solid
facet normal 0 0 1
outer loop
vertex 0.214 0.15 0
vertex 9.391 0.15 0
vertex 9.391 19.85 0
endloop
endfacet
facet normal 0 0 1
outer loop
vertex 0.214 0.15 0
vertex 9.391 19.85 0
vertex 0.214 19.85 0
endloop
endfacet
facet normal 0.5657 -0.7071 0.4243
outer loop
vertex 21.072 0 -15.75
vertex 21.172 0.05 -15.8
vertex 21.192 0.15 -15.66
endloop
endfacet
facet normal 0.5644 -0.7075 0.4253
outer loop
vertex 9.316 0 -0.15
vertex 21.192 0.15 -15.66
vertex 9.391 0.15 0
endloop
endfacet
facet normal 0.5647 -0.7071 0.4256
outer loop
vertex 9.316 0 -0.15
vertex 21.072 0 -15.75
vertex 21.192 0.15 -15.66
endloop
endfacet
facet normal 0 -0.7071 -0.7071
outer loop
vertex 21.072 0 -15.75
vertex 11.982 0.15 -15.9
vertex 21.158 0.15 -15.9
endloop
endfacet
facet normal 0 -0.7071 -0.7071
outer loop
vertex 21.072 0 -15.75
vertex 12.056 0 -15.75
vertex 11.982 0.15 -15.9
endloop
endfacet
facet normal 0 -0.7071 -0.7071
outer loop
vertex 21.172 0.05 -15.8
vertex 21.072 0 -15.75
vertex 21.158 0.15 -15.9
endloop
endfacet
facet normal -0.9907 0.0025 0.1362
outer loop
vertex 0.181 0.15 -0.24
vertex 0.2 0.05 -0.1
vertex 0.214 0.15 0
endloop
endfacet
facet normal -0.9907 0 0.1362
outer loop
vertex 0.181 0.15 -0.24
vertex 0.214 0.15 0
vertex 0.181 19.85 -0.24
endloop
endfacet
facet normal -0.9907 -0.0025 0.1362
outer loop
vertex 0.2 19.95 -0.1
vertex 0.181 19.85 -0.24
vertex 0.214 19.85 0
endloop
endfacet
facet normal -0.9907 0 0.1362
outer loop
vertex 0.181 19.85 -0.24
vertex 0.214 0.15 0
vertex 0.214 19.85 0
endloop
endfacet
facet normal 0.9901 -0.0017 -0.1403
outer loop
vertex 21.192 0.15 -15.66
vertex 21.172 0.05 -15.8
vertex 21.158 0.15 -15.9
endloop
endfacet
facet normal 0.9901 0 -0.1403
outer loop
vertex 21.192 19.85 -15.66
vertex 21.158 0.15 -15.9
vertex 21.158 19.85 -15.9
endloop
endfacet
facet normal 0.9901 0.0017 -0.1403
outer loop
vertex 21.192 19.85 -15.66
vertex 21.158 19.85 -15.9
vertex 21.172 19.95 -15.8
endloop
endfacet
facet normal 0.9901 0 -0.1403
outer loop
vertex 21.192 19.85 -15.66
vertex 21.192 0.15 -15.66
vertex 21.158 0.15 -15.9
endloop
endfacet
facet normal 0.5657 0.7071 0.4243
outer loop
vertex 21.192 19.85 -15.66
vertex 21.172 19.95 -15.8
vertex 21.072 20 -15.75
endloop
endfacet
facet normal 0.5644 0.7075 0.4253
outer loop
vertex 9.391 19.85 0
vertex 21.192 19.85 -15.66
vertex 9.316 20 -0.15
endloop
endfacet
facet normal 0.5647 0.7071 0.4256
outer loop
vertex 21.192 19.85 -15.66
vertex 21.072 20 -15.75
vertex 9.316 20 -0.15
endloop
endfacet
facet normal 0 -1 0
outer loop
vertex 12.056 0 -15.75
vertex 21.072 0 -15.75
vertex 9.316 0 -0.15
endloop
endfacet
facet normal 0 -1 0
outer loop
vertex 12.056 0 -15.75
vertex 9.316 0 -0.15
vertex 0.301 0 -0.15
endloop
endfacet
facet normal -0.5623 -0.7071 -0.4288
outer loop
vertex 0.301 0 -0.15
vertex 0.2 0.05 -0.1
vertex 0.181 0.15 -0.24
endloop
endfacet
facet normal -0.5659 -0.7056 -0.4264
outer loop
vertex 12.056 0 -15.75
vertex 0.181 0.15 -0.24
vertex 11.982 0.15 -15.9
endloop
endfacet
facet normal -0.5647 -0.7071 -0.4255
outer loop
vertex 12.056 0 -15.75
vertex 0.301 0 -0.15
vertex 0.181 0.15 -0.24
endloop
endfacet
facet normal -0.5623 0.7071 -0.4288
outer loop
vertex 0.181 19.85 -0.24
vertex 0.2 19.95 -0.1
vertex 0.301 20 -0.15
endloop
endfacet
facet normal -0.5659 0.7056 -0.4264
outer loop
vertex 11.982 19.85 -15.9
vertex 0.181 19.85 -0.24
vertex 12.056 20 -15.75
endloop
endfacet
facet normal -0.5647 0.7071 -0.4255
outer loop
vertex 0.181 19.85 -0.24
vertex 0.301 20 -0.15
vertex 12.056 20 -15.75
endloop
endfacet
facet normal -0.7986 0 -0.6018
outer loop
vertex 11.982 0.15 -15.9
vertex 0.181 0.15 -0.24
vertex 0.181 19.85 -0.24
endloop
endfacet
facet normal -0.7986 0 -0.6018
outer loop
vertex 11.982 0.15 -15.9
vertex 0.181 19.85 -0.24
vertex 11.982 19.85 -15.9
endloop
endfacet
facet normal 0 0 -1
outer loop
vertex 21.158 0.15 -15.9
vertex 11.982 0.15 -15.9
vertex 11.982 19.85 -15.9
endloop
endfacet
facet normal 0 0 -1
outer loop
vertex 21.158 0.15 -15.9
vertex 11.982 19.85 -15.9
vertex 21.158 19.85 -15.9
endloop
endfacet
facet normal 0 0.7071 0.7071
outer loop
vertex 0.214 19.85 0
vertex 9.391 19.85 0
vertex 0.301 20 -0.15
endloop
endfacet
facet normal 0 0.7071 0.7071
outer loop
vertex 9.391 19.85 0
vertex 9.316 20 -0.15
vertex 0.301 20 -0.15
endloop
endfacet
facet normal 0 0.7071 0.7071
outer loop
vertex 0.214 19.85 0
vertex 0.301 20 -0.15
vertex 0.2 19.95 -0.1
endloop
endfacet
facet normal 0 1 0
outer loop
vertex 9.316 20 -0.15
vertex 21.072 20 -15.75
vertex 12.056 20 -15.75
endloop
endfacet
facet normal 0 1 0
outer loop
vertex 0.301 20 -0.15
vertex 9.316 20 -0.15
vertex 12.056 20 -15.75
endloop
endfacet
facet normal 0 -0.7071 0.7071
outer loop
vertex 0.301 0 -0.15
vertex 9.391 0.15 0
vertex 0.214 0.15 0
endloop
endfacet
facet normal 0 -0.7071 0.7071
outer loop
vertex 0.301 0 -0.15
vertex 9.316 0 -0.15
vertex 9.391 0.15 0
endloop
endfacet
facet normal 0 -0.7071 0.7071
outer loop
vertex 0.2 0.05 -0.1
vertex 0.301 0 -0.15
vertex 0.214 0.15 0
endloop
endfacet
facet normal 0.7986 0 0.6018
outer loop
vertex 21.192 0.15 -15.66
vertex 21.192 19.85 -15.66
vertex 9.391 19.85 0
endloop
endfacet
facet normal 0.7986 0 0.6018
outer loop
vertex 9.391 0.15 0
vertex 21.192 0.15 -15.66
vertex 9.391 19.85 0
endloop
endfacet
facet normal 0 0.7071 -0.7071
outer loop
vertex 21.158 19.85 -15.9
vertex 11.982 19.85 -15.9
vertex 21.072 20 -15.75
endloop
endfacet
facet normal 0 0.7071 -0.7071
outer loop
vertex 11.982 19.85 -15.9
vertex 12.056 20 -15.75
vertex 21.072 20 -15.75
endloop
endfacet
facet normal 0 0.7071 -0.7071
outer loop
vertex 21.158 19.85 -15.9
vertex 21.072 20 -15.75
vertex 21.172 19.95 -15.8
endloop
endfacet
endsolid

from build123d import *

# Parameters (mm, degrees)
EXTRUDE_1_DEPTH        = 20
CHAMFER_1_SIZE         = 0.15
CHAMFER_2_SIZE2        = 0.3
CHAMFER_2_SIZE         = 0.214216777
CHAMFER_2_EDGE_2_SIZE2 = 0.214216777
CHAMFER_2_EDGE_2_SIZE  = 0.3


with BuildPart() as part:
    # Эскиз1 → Вытянуть1 (new body)
    with BuildSketch(Plane(origin=(0, 0, 0), x_dir=(1, 0, 0), z_dir=(0, 1, 0))):
        Polygon((11.981509397, 15.9), (21.372526833, 15.9), (9.391017436, 0), (0, 0), align=None)
    extrude(amount=EXTRUDE_1_DEPTH)

    # Фаска1
    chamfer_1_edges = [part.edges().sort_by_distance(p)[0] for p in [
        (15.381772134, 20, -7.95),
        (16.677018115, 20, -15.9),
        (5.990754698, 20, -7.95),
        (16.677018115, 0, -15.9),
        (15.381772134, 0, -7.95),
        (4.695508718, 0, 0),
        (5.990754698, 0, -7.95),
        (4.695508718, 20, 0),
    ]]
    chamfer(chamfer_1_edges, length=CHAMFER_1_SIZE)

    # Фаска2
    chamfer_2_edges = [part.edges().sort_by_distance(p)[0] for p in [
        (21.372526833, 10, -15.9),
    ]]
    chamfer(chamfer_2_edges, length=CHAMFER_2_SIZE, length2=CHAMFER_2_SIZE2)

    # Фаска2 edge 2
    chamfer_2_edge_2_edges = [part.edges().sort_by_distance(p)[0] for p in [
        (0, 10, 0),
    ]]
    chamfer(chamfer_2_edge_2_edges, length=CHAMFER_2_EDGE_2_SIZE, length2=CHAMFER_2_EDGE_2_SIZE2)


solid = part.part
